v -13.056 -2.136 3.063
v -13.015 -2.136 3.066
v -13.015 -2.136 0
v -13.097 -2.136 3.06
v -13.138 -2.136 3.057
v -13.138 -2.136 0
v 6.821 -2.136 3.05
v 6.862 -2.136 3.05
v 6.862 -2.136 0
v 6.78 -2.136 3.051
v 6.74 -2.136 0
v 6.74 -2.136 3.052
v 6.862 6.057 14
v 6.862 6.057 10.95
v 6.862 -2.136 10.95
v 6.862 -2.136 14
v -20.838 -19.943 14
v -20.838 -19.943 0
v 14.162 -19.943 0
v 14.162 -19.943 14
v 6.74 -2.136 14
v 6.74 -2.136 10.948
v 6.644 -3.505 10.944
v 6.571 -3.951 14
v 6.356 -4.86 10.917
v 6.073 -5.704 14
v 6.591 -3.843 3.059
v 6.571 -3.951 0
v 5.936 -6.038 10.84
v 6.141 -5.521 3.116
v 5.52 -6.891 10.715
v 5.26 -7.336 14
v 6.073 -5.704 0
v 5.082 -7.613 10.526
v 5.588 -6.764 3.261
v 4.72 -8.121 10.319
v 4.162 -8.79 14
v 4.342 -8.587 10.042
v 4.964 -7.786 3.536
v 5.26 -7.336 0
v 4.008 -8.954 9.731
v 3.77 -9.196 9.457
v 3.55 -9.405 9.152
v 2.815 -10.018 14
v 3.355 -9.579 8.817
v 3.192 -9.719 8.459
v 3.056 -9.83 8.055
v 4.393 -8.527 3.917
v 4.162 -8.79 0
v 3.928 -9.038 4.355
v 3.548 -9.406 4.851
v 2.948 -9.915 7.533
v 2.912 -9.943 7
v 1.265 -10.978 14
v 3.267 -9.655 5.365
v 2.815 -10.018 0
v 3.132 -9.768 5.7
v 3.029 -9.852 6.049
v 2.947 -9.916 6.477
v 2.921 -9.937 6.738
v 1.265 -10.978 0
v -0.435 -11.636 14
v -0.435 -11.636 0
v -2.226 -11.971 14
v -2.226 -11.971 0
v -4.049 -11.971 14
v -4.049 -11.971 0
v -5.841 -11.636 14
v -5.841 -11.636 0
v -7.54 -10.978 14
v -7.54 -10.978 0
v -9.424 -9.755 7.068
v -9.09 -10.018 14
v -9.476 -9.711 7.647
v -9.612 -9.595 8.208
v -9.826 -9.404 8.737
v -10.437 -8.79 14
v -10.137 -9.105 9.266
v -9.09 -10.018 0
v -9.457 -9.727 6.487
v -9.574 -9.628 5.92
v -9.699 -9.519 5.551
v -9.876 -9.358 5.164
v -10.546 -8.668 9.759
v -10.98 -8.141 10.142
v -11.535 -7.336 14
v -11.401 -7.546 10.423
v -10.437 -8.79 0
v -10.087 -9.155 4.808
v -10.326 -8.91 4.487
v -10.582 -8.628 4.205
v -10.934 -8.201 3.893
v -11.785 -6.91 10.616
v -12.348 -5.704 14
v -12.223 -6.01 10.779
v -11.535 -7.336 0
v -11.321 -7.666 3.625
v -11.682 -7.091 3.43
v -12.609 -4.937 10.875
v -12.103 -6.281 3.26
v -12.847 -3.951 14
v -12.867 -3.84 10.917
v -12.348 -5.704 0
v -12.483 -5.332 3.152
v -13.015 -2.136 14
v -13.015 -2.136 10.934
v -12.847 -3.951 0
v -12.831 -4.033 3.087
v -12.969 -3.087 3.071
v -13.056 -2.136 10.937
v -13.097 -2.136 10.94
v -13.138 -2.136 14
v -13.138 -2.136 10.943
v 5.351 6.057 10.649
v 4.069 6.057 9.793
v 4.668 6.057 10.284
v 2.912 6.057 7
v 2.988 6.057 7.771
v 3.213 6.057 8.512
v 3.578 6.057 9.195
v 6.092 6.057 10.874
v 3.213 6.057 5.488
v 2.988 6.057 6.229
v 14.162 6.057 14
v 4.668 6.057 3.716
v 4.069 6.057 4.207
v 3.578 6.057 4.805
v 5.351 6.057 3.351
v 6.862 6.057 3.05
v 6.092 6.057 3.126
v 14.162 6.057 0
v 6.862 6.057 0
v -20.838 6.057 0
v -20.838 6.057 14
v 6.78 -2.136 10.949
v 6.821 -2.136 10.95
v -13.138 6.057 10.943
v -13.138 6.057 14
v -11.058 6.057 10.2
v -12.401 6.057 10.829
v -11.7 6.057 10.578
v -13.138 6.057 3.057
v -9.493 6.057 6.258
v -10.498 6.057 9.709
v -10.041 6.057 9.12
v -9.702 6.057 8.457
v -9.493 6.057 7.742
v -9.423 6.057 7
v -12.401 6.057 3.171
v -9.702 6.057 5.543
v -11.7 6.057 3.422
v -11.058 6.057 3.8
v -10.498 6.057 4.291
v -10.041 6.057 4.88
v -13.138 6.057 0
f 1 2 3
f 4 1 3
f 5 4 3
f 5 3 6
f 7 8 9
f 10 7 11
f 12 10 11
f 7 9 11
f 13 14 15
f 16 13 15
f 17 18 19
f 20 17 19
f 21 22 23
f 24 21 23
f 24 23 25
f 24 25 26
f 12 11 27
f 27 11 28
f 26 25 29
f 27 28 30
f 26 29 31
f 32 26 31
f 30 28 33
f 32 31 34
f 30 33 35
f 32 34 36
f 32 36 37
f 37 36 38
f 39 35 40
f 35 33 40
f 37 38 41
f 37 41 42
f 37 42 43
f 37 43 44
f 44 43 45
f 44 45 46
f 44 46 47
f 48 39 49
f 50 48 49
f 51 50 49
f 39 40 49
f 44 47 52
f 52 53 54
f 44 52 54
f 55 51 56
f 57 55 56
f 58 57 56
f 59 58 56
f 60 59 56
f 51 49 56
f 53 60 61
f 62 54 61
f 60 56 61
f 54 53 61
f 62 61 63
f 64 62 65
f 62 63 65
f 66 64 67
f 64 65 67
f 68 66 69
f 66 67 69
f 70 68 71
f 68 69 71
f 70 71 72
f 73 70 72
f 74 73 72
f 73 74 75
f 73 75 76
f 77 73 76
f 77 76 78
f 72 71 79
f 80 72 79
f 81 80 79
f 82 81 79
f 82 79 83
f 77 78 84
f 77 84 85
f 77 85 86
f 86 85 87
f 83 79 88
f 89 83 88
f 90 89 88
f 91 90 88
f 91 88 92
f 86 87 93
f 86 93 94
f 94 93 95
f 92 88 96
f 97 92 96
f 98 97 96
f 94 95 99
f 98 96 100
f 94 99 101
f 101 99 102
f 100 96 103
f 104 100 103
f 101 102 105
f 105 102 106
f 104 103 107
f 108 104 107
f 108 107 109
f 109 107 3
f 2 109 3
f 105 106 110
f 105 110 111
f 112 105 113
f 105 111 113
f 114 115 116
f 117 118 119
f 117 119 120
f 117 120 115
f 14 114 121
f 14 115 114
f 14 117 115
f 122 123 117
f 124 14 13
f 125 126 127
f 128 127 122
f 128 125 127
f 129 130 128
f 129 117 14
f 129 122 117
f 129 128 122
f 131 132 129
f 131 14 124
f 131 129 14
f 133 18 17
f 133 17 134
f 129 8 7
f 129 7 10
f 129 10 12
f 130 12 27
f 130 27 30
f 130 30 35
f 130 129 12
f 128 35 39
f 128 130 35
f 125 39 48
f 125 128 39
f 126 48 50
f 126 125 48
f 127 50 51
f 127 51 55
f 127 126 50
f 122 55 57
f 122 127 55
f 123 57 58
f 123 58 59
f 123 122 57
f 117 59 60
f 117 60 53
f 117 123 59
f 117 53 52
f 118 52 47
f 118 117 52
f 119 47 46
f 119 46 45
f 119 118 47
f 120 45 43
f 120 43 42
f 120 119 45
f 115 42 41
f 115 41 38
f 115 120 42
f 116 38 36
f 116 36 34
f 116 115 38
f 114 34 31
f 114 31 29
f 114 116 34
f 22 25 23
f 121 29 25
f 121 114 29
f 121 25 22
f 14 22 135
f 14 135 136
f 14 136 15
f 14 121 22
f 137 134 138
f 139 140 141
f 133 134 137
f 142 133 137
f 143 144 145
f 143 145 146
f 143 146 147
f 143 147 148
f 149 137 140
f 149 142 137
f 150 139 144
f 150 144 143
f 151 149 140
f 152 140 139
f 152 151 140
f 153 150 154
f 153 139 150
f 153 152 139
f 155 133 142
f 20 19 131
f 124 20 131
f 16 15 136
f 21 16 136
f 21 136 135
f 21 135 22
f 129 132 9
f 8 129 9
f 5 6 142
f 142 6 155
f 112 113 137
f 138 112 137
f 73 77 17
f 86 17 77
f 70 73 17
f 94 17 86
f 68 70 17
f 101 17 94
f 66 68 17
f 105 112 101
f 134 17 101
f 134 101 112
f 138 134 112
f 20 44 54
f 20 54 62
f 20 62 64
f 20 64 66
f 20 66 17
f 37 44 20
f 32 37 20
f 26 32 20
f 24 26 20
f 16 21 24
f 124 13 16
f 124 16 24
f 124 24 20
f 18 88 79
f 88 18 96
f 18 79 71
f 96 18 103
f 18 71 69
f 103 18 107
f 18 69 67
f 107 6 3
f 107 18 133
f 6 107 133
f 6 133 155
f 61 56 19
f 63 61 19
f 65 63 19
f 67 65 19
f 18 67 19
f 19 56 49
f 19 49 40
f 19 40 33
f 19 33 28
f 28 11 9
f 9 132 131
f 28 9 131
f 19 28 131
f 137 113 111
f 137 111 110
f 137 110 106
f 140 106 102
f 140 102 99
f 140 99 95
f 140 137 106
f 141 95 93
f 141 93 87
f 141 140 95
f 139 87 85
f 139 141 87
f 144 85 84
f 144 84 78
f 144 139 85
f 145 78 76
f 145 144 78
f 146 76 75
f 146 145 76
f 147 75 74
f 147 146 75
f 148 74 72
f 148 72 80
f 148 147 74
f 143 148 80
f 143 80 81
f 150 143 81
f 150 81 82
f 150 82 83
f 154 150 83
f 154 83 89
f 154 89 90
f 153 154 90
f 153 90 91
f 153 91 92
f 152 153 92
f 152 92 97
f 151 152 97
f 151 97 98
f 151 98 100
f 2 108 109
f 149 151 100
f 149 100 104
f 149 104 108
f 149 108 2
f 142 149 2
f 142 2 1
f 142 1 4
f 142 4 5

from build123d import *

# Parameters (mm, degrees)
F0_W     = 35
F0_H     = 26
F1_DEPTH = 14
F3_DEPTH = 32.63313
F4_R     = 3.95
F5_DEPTH = 25


with BuildPart() as f1:
    # F0 (on Top) → F1 (new body)
    with BuildSketch(Plane.XY):
        with Locations((-3.3376533666, -6.9431716278)):
            Rectangle(F0_W, F0_H)
    extrude(amount=F1_DEPTH)

    # F2 (on face) → F3 (cut)
    with BuildSketch(Plane(origin=(0, 0, 0), x_dir=(1, 0, 0), z_dir=(0, 0, -1))):
        with BuildLine():
            Line((-13.1376533666, 2.1359970383), (-13.1376533666, -6.0568283722))
            Line((-13.1376533666, -6.0568283722), (-8.6545346445, -6.0568283722))
            ThreePointArc((-8.6545346445, -6.0568283722), (-11.8568708771, -2.5044354035), (-13.0148172936, 2.1359970383))
            Line((-13.0148172936, 2.1359970383), (-13.1376533666, 2.1359970383))
        make_face()
        with BuildLine():
            ThreePointArc((-13.0148172936, 2.1359970383), (-11.8568708771, -2.5044354035), (-8.6545346445, -6.0568283722))
            Line((-8.6545346445, -6.0568283722), (2.3792279113, -6.0568283722))
            ThreePointArc((2.3792279113, -6.0568283722), (5.5815641438, -2.5044354035), (6.7395105604, 2.1359970383))
            Line((6.7395105604, 2.1359970383), (-13.0148172936, 2.1359970383))
        make_face()
        with BuildLine():
            ThreePointArc((6.7395105604, 2.1359970383), (5.5815641438, -2.5044354035), (2.3792279113, -6.0568283722))
            Line((2.3792279113, -6.0568283722), (6.8623466334, -6.0568283722))
            Line((6.8623466334, -6.0568283722), (6.8623466334, 2.1359970383))
            Line((6.8623466334, 2.1359970383), (6.7395105604, 2.1359970383))
        make_face()
        with BuildLine():
            ThreePointArc((6.7395105604, 2.1359970383), (-3.1376533666, 12.0131609653), (-13.0148172936, 2.1359970383))
            Line((-13.0148172936, 2.1359970383), (6.7395105604, 2.1359970383))
        make_face()
    extrude(amount=-F3_DEPTH, mode=Mode.SUBTRACT)

    # F4 (on face) → F5 (join)
    with BuildSketch(Plane(origin=(0, 6.0568283722, 0), x_dir=(-1, 0, 0), z_dir=(0, 1, 0))):
        with Locations((13.3731277149, 7)):
            Circle(F4_R)
        with BuildLine():
            ThreePointArc((-6.8623466334, 3.05), (-4.0692748477, 4.2069282143), (-2.9123466334, 7))
            ThreePointArc((-2.9123466334, 7), (-4.0692748477, 9.7930717857), (-6.8623466334, 10.95))
            Line((-6.8623466334, 10.95), (-6.8623466334, 3.05))
        make_face()
    extrude(amount=-F5_DEPTH)


solid = f1.part
